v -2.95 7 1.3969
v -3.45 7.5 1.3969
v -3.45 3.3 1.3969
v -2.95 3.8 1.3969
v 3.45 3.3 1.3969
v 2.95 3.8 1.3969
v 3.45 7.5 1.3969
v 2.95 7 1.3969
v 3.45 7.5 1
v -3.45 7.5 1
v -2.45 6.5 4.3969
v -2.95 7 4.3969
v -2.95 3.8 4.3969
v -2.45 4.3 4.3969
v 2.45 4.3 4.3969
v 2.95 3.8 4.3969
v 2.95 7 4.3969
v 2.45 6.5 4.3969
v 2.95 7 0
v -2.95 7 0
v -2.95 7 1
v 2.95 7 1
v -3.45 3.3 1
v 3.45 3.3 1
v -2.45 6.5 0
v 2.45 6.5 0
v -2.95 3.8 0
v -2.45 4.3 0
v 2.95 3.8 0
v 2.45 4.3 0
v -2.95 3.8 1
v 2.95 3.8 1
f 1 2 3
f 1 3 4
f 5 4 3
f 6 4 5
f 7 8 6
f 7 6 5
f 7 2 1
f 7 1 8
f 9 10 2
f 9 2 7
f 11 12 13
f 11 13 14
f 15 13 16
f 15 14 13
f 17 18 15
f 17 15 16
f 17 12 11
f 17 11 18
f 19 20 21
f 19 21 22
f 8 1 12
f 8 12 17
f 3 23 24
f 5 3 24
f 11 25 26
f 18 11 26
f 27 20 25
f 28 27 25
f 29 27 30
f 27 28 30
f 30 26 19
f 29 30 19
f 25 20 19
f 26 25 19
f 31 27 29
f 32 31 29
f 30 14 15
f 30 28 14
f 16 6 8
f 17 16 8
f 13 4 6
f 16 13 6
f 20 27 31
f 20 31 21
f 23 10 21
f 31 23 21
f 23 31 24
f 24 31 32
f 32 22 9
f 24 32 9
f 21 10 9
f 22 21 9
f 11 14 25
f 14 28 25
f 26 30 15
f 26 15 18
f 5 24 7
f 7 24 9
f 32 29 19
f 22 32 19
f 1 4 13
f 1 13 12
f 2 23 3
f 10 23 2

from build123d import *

# Parameters (mm, degrees)
SKETCH1_W           = 5.9
SKETCH1_H           = 3.2
SKETCH1_W_2         = 4.9
SKETCH1_H_2         = 2.2
BOSS_EXTRUDE1_DEPTH = 1
SKETCH2_W           = 6.9
SKETCH2_H           = 4.2
SKETCH2_W_2         = 4.9
SKETCH2_H_2         = 2.2
BOSS_EXTRUDE2_DEPTH = 0.396875
SKETCH3_W           = 5.9
SKETCH3_H           = 3.2
SKETCH3_W_2         = 4.9
SKETCH3_H_2         = 2.2
BOSS_EXTRUDE3_DEPTH = 3


with BuildPart() as part:
    # Sketch1 → Boss-Extrude1 (new body)
    with BuildSketch(Plane.XY):
        with Locations((0, 5.4)):
            Rectangle(SKETCH1_W, SKETCH1_H)
        with Locations((0, 5.4)):
            Rectangle(SKETCH1_W_2, SKETCH1_H_2, mode=Mode.SUBTRACT)
    extrude(amount=BOSS_EXTRUDE1_DEPTH)

    # Sketch2 → Boss-Extrude2 (add)
    with BuildSketch(Plane.XY.offset(1)):
        with Locations((0, 5.4)):
            Rectangle(SKETCH2_W, SKETCH2_H)
        with Locations((0, 5.4)):
            Rectangle(SKETCH2_W_2, SKETCH2_H_2, mode=Mode.SUBTRACT)
    extrude(amount=BOSS_EXTRUDE2_DEPTH)

    # Sketch3 → Boss-Extrude3 (add)
    with BuildSketch(Plane.XY.offset(1.396875)):
        with Locations((0, 5.4)):
            Rectangle(SKETCH3_W, SKETCH3_H)
        with Locations((0, 5.4)):
            Rectangle(SKETCH3_W_2, SKETCH3_H_2, mode=Mode.SUBTRACT)
    extrude(amount=BOSS_EXTRUDE3_DEPTH)


solid = part.part
